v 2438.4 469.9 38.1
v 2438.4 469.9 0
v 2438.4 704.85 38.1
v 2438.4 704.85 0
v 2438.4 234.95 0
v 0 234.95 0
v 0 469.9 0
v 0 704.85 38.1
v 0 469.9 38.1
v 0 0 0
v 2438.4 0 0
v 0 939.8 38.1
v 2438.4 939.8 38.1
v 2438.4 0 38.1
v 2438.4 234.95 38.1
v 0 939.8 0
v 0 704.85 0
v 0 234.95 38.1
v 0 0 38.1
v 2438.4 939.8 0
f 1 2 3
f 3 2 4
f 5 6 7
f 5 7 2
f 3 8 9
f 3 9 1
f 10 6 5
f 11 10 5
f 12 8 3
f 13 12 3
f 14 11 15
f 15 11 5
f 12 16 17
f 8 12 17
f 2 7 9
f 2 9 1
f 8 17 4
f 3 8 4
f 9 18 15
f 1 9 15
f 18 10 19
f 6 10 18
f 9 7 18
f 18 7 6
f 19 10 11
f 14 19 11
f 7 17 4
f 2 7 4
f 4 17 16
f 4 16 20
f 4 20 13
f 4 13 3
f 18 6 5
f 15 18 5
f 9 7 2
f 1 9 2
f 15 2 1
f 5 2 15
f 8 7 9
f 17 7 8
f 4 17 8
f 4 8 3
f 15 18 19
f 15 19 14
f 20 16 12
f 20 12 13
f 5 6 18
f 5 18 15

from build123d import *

# Parameters (mm, degrees)
F0_W     = 2438.4
F0_H     = 234.95
F1_DEPTH = 38.1


with BuildPart() as f1:
    # F0 (on Top) → F1 (new body)
    with BuildSketch(Plane.XY):
        with Locations((1219.2, 117.475)):
            Rectangle(F0_W, F0_H)
    extrude(amount=F1_DEPTH)


with BuildPart() as f2_1:
    # F2: instance of F1
    add(f1.part.mirror(Plane(origin=(1219.2, 234.95, 19.05), x_dir=(-1, 0, 0), z_dir=(0, 1, 0))))


with BuildPart() as f3_1:
    # F3: instance of F2_1
    add(f2_1.part.mirror(Plane(origin=(1219.2, 469.9, 19.05), x_dir=(-1, 0, 0), z_dir=(0, 1, 0))))


with BuildPart() as f3_2:
    # F3: instance of F1
    add(f1.part.mirror(Plane(origin=(1219.2, 469.9, 19.05), x_dir=(-1, 0, 0), z_dir=(0, 1, 0))))


solid = Compound([f1.part, f2_1.part, f3_1.part, f3_2.part])
